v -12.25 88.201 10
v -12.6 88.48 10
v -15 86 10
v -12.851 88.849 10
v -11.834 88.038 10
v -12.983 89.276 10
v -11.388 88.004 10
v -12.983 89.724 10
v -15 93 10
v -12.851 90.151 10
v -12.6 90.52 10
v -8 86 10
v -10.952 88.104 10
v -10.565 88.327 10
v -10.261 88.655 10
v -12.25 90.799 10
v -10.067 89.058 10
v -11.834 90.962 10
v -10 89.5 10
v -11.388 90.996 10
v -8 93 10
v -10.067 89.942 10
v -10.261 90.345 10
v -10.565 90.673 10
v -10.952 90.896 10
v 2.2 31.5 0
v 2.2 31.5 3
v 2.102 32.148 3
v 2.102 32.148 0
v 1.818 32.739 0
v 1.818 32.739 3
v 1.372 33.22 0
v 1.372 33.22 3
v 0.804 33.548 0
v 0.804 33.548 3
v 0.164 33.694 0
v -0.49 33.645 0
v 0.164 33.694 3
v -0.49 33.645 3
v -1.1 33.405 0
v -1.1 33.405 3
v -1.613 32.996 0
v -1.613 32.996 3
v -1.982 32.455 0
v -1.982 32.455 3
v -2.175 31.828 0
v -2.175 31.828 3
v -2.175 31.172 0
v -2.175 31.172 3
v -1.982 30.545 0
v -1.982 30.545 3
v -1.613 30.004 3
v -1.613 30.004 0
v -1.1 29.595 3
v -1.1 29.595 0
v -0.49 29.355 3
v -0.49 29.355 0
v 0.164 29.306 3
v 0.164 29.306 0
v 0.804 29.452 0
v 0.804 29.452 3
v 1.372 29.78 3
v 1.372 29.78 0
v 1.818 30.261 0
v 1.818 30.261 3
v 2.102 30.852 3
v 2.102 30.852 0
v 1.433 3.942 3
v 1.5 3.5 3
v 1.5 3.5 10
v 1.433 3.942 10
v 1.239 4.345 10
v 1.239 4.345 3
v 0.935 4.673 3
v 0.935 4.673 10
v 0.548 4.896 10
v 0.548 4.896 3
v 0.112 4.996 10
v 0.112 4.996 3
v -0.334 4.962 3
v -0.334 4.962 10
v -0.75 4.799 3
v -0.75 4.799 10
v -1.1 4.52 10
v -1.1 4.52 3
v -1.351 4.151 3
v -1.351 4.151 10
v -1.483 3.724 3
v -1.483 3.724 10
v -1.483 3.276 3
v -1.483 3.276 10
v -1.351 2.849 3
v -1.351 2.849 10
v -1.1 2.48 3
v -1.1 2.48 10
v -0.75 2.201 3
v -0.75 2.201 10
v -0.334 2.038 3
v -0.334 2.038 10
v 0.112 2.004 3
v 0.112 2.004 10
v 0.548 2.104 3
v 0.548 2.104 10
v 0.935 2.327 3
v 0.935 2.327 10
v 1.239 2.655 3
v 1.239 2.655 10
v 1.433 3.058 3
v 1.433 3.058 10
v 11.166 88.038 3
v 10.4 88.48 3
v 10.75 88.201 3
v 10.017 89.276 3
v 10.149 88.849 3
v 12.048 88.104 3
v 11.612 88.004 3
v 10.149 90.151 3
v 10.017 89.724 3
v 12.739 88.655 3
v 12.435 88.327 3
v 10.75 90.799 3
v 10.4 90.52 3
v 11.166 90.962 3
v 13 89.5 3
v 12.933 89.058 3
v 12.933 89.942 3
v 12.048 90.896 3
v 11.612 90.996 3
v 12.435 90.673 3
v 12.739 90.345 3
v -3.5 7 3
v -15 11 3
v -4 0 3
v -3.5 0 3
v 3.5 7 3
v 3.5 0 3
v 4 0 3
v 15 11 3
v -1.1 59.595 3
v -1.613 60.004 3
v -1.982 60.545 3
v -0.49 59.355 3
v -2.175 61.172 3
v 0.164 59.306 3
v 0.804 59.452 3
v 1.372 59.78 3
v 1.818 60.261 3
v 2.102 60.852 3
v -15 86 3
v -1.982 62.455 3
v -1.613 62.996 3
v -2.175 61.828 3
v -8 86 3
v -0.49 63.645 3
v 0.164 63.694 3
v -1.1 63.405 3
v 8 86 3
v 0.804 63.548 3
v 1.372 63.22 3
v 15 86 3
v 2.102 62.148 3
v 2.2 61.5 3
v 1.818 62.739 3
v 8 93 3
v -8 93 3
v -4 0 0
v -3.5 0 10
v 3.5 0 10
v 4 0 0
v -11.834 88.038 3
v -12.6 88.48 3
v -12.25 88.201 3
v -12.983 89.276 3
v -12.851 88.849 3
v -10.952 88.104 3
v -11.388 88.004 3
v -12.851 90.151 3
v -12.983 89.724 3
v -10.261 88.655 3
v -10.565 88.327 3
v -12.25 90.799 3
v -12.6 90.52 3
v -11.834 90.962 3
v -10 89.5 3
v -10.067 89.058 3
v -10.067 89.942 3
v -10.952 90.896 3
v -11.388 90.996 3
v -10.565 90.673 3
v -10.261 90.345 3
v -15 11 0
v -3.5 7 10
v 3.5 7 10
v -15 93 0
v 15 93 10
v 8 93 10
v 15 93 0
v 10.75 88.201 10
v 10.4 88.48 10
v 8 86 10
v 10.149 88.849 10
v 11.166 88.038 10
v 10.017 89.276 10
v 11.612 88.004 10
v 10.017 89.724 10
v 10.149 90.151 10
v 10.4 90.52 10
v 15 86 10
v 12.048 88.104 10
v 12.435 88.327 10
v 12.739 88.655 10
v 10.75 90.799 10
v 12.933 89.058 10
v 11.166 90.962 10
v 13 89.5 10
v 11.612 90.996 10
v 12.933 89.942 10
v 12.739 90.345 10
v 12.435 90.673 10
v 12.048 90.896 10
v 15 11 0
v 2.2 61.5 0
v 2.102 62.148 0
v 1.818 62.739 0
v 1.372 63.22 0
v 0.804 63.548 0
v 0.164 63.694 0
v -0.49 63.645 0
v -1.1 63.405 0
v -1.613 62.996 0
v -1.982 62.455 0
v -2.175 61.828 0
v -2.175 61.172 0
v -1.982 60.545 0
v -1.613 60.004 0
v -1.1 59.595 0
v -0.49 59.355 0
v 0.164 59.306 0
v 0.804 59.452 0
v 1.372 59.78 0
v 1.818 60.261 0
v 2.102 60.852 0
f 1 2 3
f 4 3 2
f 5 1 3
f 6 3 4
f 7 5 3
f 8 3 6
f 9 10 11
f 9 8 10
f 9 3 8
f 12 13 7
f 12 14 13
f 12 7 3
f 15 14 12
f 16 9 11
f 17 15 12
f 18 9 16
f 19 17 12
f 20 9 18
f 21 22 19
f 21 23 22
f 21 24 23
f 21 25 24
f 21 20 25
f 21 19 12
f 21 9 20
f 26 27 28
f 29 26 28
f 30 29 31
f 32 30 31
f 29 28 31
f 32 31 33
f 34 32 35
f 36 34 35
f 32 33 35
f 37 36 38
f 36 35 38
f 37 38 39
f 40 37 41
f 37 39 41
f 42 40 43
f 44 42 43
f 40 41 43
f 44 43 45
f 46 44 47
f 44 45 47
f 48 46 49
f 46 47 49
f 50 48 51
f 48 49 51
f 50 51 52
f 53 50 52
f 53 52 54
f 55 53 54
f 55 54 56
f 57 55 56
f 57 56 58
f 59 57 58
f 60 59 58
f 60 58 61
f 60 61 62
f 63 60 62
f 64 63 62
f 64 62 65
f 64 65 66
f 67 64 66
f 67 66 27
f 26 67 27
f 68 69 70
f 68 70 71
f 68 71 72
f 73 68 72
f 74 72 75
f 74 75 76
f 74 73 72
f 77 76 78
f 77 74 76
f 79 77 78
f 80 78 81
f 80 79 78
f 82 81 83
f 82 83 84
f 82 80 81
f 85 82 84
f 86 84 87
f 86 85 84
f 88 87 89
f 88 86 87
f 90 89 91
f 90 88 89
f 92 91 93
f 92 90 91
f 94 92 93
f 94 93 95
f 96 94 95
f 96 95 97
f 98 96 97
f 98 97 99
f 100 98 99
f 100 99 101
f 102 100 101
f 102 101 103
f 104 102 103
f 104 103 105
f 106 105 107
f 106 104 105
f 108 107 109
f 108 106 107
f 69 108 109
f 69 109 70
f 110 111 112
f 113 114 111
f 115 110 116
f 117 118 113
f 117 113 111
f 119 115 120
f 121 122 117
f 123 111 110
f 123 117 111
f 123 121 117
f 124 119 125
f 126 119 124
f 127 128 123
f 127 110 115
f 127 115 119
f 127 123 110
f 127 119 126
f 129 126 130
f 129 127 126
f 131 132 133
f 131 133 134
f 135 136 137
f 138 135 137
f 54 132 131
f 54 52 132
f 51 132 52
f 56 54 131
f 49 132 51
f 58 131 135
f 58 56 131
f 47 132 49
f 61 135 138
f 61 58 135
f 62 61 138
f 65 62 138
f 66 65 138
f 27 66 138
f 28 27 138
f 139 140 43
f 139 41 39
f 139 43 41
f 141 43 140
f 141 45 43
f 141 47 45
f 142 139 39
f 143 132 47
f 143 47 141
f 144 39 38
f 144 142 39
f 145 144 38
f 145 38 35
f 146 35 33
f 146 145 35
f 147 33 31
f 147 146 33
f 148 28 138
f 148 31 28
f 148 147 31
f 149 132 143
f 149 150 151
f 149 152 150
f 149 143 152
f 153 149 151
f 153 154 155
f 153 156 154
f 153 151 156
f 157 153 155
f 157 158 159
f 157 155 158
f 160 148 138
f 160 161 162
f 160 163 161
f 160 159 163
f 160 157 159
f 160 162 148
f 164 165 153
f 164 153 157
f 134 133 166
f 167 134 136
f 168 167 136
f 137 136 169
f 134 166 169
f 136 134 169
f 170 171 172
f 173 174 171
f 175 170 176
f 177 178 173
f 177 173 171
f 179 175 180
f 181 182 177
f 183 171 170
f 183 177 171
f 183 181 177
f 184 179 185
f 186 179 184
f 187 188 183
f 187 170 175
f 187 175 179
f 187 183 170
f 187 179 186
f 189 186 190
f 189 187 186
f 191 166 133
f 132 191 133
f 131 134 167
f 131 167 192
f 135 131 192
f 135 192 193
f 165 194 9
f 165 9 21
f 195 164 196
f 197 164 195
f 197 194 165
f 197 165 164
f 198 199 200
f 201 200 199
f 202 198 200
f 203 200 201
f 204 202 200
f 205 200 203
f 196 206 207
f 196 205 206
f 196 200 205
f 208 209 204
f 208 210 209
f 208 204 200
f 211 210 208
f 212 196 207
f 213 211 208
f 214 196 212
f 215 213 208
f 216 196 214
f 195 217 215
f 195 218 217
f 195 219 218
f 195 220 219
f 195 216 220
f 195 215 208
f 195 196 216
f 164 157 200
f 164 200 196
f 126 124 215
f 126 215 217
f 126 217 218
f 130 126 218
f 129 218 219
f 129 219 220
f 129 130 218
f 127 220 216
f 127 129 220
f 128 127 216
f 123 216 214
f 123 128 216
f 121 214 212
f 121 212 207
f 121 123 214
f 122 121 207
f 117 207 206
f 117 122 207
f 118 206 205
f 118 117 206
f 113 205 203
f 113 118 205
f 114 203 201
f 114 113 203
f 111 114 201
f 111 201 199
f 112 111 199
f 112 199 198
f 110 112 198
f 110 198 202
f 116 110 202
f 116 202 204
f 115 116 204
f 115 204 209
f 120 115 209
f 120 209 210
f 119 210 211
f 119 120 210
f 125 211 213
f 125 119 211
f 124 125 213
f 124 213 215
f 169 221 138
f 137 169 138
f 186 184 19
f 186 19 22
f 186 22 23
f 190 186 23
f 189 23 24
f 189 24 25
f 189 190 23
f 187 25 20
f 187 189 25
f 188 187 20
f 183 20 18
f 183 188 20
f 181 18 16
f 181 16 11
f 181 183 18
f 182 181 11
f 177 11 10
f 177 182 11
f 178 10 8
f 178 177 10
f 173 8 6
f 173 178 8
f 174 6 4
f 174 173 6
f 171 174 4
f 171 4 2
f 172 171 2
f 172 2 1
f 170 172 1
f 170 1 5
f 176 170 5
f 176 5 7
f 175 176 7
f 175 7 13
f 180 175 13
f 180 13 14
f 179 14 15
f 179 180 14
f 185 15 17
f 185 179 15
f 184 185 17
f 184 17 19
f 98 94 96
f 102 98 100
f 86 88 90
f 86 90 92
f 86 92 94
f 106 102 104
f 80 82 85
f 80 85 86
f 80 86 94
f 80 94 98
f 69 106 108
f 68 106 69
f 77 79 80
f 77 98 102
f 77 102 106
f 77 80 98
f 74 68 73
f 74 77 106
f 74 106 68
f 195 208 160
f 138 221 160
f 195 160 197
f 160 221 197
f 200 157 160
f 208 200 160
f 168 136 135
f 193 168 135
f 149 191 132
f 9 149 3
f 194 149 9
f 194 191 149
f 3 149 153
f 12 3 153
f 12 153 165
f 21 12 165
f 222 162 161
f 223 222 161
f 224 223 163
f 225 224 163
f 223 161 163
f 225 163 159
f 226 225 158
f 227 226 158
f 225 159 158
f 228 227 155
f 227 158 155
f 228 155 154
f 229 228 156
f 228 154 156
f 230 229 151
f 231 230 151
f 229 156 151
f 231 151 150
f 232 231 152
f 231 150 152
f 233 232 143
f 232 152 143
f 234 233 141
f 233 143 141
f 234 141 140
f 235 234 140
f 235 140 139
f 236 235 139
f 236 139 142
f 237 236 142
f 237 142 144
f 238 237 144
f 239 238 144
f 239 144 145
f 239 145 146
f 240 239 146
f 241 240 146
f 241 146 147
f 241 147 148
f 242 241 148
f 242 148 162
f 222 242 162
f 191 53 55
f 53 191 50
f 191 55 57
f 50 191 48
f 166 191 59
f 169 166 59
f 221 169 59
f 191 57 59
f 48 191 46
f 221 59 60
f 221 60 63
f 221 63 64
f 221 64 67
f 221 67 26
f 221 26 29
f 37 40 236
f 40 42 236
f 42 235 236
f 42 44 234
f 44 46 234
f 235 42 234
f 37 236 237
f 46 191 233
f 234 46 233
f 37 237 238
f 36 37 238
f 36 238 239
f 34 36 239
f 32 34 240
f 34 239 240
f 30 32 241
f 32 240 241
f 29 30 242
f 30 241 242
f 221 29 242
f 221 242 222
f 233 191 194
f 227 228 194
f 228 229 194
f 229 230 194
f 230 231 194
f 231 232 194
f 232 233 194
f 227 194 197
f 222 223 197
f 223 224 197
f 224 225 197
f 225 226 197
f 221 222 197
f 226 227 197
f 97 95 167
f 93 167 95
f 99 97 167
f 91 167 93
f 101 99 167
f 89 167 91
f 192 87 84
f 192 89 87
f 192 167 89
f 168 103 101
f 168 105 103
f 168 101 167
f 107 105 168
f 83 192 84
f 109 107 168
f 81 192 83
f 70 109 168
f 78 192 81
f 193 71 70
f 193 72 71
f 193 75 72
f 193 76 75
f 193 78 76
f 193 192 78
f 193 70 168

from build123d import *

# Parameters (mm, degrees)
SKETCH_W     = 30
SKETCH_H     = 93
PAD_DEPTH    = 3
SKETCH001_W  = 7
SKETCH001_H  = 7
SKETCH001_R  = 1.5
PAD001_DEPTH = 7
SKETCH002_R  = 2.2
HOLE_DEPTH   = 25
CHAMFER_SIZE = 11


with BuildPart() as part:
    # Sketch → Pad (new body)
    with BuildSketch(Plane.XY):
        with Locations((0, 46.5)):
            Rectangle(SKETCH_W, SKETCH_H)
    extrude(amount=PAD_DEPTH)

    # Sketch001 (on Face6 of Pad) → Pad001 (join)
    with BuildSketch(Plane.XY.offset(3)):
        with Locations((0, 3.5)):
            Rectangle(SKETCH001_W, SKETCH001_H)
        with Locations((0, 3.5)):
            Circle(SKETCH001_R, mode=Mode.SUBTRACT)
        with Locations((-11.5, 89.5)):
            Rectangle(SKETCH001_W, SKETCH001_H)
        with Locations((-11.5, 89.5)):
            Circle(SKETCH001_R, mode=Mode.SUBTRACT)
        with Locations((11.5, 89.5)):
            Rectangle(SKETCH001_W, SKETCH001_H)
        with Locations((11.5, 89.5)):
            Circle(SKETCH001_R, mode=Mode.SUBTRACT)
    extrude(amount=PAD001_DEPTH)

    # Sketch002 (on Face6 of Pad001) → Hole (cut)
    with BuildSketch(Plane.XY.offset(3)):
        with Locations((0, 61.5)):
            Circle(SKETCH002_R)
        with Locations((0, 31.5)):
            Circle(SKETCH002_R)
    extrude(amount=-HOLE_DEPTH, mode=Mode.SUBTRACT)

    # Chamfer
    chamfer_edges = [part.edges().sort_by_distance(p)[0] for p in [
        (15, 0, 1.5),
        (-15, 0, 1.5),
    ]]
    chamfer(chamfer_edges, length=CHAMFER_SIZE)


solid = part.part
